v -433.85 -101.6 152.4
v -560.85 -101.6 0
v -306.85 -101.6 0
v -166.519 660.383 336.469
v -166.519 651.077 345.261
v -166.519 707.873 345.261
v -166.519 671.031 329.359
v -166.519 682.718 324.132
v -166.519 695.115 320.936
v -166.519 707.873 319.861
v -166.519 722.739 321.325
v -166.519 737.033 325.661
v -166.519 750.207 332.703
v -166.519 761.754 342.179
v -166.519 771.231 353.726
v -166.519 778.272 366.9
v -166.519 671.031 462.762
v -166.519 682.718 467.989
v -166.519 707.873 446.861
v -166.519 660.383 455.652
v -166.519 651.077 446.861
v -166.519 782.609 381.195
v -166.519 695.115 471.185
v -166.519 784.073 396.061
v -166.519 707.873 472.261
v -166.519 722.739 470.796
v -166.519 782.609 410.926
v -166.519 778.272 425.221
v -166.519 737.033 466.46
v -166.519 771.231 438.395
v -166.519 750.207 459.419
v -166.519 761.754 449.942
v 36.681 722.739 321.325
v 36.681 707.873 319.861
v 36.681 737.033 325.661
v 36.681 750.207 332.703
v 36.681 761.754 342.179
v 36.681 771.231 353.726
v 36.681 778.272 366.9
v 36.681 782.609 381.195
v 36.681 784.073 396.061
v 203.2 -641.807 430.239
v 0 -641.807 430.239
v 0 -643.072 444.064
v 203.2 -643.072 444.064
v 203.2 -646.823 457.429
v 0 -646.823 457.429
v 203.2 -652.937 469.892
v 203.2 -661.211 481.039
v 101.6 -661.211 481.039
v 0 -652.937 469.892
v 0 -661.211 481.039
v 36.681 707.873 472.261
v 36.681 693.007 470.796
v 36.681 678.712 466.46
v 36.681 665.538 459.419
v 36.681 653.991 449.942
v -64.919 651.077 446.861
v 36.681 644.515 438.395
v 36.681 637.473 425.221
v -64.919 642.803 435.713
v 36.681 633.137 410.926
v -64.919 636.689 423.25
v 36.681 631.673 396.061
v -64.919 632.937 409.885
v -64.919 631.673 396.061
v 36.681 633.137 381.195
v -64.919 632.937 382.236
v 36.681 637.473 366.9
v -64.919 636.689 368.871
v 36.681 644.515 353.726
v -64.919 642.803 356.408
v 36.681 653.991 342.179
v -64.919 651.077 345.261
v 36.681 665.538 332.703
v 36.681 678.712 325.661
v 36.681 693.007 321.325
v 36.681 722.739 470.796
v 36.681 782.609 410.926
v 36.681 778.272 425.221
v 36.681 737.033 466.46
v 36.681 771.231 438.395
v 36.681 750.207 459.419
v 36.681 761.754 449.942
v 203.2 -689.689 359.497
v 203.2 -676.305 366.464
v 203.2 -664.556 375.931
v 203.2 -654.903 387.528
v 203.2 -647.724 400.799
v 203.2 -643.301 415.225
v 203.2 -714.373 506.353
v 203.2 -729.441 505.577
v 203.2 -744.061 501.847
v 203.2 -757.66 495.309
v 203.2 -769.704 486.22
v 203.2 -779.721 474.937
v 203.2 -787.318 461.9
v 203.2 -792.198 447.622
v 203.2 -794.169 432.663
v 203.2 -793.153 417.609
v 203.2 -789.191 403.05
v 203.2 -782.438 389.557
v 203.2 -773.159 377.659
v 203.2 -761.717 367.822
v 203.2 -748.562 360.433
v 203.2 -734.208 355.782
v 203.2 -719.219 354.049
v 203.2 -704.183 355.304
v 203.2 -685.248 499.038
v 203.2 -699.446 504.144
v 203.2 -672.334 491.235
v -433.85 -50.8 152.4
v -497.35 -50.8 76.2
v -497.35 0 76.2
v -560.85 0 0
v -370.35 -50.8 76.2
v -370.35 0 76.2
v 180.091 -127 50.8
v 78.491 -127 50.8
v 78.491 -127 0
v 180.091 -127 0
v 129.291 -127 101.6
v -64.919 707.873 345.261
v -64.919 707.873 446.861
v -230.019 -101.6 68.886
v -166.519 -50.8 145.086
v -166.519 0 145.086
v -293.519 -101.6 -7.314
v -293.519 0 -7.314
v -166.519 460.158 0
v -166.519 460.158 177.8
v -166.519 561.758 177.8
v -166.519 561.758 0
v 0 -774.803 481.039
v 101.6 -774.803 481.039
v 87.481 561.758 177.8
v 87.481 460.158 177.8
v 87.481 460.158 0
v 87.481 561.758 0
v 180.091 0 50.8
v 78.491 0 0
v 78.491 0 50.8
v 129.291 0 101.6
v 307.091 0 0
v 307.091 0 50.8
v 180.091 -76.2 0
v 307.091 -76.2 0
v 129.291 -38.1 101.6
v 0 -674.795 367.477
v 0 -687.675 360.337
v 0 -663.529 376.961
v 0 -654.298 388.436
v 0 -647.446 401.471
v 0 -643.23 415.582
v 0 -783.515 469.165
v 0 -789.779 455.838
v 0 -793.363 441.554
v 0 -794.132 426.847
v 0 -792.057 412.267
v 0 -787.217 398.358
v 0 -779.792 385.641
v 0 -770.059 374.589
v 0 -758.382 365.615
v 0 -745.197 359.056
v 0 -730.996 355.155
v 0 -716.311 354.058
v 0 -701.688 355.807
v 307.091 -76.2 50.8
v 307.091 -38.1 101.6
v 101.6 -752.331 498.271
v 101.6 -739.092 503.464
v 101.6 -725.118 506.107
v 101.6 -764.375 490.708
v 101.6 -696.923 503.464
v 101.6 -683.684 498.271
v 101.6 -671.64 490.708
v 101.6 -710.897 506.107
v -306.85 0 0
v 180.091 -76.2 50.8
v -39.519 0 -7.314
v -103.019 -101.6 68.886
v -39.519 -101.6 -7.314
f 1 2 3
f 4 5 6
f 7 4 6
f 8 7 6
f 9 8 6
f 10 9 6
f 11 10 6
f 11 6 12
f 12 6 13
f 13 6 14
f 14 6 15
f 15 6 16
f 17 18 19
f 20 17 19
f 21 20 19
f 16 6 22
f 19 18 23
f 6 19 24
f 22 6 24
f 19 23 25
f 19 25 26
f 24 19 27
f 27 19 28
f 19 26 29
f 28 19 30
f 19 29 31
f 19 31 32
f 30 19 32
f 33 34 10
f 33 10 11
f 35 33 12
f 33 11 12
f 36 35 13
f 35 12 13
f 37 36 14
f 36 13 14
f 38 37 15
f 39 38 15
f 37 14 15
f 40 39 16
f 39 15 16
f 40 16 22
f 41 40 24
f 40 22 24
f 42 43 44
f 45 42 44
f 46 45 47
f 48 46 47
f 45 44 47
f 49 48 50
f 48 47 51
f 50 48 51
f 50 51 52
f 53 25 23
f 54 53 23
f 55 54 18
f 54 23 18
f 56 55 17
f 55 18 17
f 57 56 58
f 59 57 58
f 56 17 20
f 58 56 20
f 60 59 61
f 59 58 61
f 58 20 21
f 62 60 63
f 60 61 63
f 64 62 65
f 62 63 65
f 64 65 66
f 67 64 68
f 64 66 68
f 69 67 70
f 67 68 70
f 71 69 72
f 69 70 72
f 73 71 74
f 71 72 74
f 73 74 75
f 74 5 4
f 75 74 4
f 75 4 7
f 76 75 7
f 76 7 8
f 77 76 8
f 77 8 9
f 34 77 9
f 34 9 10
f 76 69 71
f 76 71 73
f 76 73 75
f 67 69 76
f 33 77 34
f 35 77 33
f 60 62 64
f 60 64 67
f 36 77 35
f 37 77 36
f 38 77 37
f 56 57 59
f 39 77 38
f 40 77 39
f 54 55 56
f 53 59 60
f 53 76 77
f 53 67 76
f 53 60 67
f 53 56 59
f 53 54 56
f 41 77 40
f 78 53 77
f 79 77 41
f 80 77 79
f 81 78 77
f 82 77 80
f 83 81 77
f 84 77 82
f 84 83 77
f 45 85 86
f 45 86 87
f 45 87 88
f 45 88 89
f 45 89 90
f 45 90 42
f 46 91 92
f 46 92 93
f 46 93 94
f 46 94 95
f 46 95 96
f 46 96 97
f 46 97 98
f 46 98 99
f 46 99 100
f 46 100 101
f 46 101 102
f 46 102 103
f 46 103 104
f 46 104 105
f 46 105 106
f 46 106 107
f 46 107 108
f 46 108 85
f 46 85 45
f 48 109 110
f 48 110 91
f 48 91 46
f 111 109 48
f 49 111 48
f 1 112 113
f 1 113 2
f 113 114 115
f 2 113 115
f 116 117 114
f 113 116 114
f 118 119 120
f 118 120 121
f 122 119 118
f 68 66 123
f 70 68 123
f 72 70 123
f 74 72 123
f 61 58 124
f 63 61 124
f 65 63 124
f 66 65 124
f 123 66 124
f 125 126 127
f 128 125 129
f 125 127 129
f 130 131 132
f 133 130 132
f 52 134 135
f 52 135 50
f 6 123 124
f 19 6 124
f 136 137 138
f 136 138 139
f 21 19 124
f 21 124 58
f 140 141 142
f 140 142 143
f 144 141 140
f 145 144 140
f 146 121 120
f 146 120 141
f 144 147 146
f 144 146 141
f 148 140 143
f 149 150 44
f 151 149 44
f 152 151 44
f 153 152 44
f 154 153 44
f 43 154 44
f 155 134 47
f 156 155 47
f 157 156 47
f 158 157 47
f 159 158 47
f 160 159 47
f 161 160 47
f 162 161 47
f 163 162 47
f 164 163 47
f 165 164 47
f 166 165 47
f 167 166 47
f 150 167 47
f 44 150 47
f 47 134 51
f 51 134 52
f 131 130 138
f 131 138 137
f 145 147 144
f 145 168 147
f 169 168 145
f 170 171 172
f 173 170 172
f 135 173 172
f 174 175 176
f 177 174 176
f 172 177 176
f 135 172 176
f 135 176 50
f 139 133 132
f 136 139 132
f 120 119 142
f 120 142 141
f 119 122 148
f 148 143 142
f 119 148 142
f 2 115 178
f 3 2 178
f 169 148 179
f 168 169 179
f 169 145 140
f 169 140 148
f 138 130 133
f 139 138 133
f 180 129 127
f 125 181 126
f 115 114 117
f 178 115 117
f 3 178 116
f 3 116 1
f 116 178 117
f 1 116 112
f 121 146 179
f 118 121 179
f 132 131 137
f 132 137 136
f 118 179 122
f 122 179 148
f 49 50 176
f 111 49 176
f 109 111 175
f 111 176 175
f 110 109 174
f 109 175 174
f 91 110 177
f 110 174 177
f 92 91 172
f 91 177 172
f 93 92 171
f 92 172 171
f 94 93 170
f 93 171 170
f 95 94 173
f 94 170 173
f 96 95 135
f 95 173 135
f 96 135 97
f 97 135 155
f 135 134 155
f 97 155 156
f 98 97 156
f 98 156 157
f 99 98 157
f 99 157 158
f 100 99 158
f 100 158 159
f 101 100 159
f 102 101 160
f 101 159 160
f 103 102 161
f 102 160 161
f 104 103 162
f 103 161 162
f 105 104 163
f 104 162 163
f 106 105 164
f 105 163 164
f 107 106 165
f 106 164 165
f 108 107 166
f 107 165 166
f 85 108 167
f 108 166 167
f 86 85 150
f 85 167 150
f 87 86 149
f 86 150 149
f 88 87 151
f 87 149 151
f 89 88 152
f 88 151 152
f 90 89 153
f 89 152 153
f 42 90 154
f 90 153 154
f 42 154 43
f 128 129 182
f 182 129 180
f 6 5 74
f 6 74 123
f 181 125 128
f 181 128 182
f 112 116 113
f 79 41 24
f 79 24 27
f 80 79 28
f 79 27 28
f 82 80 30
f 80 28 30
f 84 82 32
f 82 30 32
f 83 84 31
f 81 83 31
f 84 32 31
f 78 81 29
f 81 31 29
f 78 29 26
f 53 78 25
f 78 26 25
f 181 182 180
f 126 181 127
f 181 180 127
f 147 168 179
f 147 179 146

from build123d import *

# Parameters (mm, degrees)
F1_DEPTH  = 101.6
F3_DEPTH  = 50.8
F5_DEPTH  = 101.6
F9_DEPTH  = 76.2
F11_DEPTH = 127
F14_DEPTH = 177.8
F16_DEPTH = 203.2
F18_DEPTH = 101.6
F20_DEPTH = 203.2
F21_DEPTH = 101.6
F22_W     = 101.6
F22_H     = 177.8
F23_DEPTH = 254


# Not quite as in the source:
# - a feature of the source that left no trace in its solid (it failed there, or was rolled back) is left out


with BuildPart() as f1:
    # F0 (on Front) → F1 (new body)
    with BuildSketch(Plane.XZ):
        Polygon((-433.850009223, 152.4), (-560.850009223, 0), (-306.850009223, 0), align=None)
    extrude(amount=F1_DEPTH)

    # F2 (on face) → F3 (cut)
    with BuildSketch(Plane(origin=(0, 0, 0), x_dir=(-1, 0, 0), z_dir=(0, 1, 0))):
        Polygon((433.850009223, 152.4), (370.350009223, 76.2), (497.350009223, 76.2), align=None)
    extrude(amount=-F3_DEPTH, mode=Mode.SUBTRACT)


with BuildPart() as f5:
    # F4 (on Front) → F5 (new body)
    with BuildSketch(Plane.XZ):
        Polygon((-293.5190707178, -7.3142740584), (-39.5190707178, -7.3142740584), (-166.5190707178, 145.0857259416), align=None)
    extrude(amount=F5_DEPTH)

    # F8 (on 3pt) → F9 (cut, symmetric)
    with BuildSketch(Plane.YZ.offset(-166.5190707178)):
        Polygon((-50.8, 145.0857259416), (-101.6, 145.0857259416), (-101.6, 68.8857259416), align=None)
    extrude(amount=F9_DEPTH, both=True, mode=Mode.SUBTRACT)


with BuildPart() as f11:
    # F10 (on Front) → F11 (new body)
    with BuildSketch(Plane.XZ):
        Polygon((78.4911467291, 50.8), (78.4911467291, 0), (180.0911467291, 0), (180.0911467291, 50.8), (129.2911467291, 101.6), align=None)
    extrude(amount=F11_DEPTH)

    # F13 (on offset) → F14 (join)
    with BuildSketch(Plane.YZ.offset(307.0911467291)):
        Polygon((-76.2, 0), (0, 0), (0, 50.8), (-38.1, 101.6), (-76.2, 50.8), align=None)
    extrude(amount=-F14_DEPTH)


with BuildPart() as f16:
    # F15 (on Right) → F16 (new body)
    with BuildSketch(Plane.YZ):
        with BuildLine():
            ThreePointArc((-774.8033335453, 481.0394390106), (-745.1970501575, 359.0555052577), (-641.8072069168, 430.2394390106))
            ThreePointArc((-641.8072069168, 430.2394390106), (-646.8232731639, 457.4292822513), (-661.2110802883, 481.0394390106))
            Line((-661.2110802883, 481.0394390106), (-718.0072069168, 481.0394390106))
            Line((-718.0072069168, 481.0394390106), (-774.8033335453, 481.0394390106))
        make_face()
        with BuildLine():
            Line((-718.0072069168, 481.0394390106), (-661.2110802883, 481.0394390106))
            ThreePointArc((-661.2110802883, 481.0394390106), (-718.0072069168, 506.4394390106), (-774.8033335453, 481.0394390106))
            Line((-774.8033335453, 481.0394390106), (-718.0072069168, 481.0394390106))
        make_face()
    extrude(amount=F16_DEPTH)

    # F15 (on Right) → F18 (cut)
    with BuildSketch(Plane.YZ):
        with BuildLine():
            Line((-718.0072069168, 481.0394390106), (-661.2110802883, 481.0394390106))
            ThreePointArc((-661.2110802883, 481.0394390106), (-718.0072069168, 506.4394390106), (-774.8033335453, 481.0394390106))
            Line((-774.8033335453, 481.0394390106), (-718.0072069168, 481.0394390106))
        make_face()
    extrude(amount=F18_DEPTH, mode=Mode.SUBTRACT)


with BuildPart() as f20:
    # F19 (on 3pt) → F20 (new body)
    with BuildSketch(Plane.YZ.offset(-166.5190707178)):
        with BuildLine():
            Line((707.8727483749, 446.860526371), (707.8727483749, 472.260526371))
            ThreePointArc((707.8727483749, 472.260526371), (676.7642286416, 465.6212911742), (651.0766217464, 446.860526371))
            Line((651.0766217464, 446.860526371), (707.8727483749, 446.860526371))
        make_face()
        with BuildLine():
            ThreePointArc((651.0766217464, 345.260526371), (676.7642286416, 326.4997615678), (707.8727483749, 319.860526371))
            Line((707.8727483749, 319.860526371), (707.8727483749, 345.260526371))
            Line((707.8727483749, 345.260526371), (651.0766217464, 345.260526371))
        make_face()
        with BuildLine():
            ThreePointArc((707.8727483749, 319.860526371), (761.7542851014, 342.1789896446), (784.0727483749, 396.060526371))
            ThreePointArc((784.0727483749, 396.060526371), (761.7542851014, 449.9420630974), (707.8727483749, 472.260526371))
            Line((707.8727483749, 472.260526371), (707.8727483749, 446.860526371))
            Line((707.8727483749, 446.860526371), (707.8727483749, 396.060526371))
            Line((707.8727483749, 396.060526371), (707.8727483749, 345.260526371))
            Line((707.8727483749, 345.260526371), (707.8727483749, 319.860526371))
        make_face()
        with BuildLine():
            Line((707.8727483749, 446.860526371), (651.0766217464, 446.860526371))
            ThreePointArc((651.0766217464, 446.860526371), (631.6727483749, 396.060526371), (651.0766217464, 345.260526371))
            Line((651.0766217464, 345.260526371), (707.8727483749, 345.260526371))
            Line((707.8727483749, 345.260526371), (707.8727483749, 396.060526371))
            Line((707.8727483749, 396.060526371), (707.8727483749, 446.860526371))
        make_face()
    extrude(amount=F20_DEPTH)

    # F19 (on 3pt) → F21 (cut)
    with BuildSketch(Plane.YZ.offset(-166.5190707178)):
        with BuildLine():
            Line((707.8727483749, 446.860526371), (651.0766217464, 446.860526371))
            ThreePointArc((651.0766217464, 446.860526371), (631.6727483749, 396.060526371), (651.0766217464, 345.260526371))
            Line((651.0766217464, 345.260526371), (707.8727483749, 345.260526371))
            Line((707.8727483749, 345.260526371), (707.8727483749, 396.060526371))
            Line((707.8727483749, 396.060526371), (707.8727483749, 446.860526371))
        make_face()
    extrude(amount=F21_DEPTH, mode=Mode.SUBTRACT)


with BuildPart() as f23:
    # F22 (on 3pt) → F23 (new body)
    with BuildSketch(Plane.YZ.offset(-166.5190707178)):
        with Locations((510.9579086026, 88.9)):
            Rectangle(F22_W, F22_H)
    extrude(amount=F23_DEPTH)


solid = Compound([f1.part, f5.part, f11.part, f16.part, f20.part, f23.part])
